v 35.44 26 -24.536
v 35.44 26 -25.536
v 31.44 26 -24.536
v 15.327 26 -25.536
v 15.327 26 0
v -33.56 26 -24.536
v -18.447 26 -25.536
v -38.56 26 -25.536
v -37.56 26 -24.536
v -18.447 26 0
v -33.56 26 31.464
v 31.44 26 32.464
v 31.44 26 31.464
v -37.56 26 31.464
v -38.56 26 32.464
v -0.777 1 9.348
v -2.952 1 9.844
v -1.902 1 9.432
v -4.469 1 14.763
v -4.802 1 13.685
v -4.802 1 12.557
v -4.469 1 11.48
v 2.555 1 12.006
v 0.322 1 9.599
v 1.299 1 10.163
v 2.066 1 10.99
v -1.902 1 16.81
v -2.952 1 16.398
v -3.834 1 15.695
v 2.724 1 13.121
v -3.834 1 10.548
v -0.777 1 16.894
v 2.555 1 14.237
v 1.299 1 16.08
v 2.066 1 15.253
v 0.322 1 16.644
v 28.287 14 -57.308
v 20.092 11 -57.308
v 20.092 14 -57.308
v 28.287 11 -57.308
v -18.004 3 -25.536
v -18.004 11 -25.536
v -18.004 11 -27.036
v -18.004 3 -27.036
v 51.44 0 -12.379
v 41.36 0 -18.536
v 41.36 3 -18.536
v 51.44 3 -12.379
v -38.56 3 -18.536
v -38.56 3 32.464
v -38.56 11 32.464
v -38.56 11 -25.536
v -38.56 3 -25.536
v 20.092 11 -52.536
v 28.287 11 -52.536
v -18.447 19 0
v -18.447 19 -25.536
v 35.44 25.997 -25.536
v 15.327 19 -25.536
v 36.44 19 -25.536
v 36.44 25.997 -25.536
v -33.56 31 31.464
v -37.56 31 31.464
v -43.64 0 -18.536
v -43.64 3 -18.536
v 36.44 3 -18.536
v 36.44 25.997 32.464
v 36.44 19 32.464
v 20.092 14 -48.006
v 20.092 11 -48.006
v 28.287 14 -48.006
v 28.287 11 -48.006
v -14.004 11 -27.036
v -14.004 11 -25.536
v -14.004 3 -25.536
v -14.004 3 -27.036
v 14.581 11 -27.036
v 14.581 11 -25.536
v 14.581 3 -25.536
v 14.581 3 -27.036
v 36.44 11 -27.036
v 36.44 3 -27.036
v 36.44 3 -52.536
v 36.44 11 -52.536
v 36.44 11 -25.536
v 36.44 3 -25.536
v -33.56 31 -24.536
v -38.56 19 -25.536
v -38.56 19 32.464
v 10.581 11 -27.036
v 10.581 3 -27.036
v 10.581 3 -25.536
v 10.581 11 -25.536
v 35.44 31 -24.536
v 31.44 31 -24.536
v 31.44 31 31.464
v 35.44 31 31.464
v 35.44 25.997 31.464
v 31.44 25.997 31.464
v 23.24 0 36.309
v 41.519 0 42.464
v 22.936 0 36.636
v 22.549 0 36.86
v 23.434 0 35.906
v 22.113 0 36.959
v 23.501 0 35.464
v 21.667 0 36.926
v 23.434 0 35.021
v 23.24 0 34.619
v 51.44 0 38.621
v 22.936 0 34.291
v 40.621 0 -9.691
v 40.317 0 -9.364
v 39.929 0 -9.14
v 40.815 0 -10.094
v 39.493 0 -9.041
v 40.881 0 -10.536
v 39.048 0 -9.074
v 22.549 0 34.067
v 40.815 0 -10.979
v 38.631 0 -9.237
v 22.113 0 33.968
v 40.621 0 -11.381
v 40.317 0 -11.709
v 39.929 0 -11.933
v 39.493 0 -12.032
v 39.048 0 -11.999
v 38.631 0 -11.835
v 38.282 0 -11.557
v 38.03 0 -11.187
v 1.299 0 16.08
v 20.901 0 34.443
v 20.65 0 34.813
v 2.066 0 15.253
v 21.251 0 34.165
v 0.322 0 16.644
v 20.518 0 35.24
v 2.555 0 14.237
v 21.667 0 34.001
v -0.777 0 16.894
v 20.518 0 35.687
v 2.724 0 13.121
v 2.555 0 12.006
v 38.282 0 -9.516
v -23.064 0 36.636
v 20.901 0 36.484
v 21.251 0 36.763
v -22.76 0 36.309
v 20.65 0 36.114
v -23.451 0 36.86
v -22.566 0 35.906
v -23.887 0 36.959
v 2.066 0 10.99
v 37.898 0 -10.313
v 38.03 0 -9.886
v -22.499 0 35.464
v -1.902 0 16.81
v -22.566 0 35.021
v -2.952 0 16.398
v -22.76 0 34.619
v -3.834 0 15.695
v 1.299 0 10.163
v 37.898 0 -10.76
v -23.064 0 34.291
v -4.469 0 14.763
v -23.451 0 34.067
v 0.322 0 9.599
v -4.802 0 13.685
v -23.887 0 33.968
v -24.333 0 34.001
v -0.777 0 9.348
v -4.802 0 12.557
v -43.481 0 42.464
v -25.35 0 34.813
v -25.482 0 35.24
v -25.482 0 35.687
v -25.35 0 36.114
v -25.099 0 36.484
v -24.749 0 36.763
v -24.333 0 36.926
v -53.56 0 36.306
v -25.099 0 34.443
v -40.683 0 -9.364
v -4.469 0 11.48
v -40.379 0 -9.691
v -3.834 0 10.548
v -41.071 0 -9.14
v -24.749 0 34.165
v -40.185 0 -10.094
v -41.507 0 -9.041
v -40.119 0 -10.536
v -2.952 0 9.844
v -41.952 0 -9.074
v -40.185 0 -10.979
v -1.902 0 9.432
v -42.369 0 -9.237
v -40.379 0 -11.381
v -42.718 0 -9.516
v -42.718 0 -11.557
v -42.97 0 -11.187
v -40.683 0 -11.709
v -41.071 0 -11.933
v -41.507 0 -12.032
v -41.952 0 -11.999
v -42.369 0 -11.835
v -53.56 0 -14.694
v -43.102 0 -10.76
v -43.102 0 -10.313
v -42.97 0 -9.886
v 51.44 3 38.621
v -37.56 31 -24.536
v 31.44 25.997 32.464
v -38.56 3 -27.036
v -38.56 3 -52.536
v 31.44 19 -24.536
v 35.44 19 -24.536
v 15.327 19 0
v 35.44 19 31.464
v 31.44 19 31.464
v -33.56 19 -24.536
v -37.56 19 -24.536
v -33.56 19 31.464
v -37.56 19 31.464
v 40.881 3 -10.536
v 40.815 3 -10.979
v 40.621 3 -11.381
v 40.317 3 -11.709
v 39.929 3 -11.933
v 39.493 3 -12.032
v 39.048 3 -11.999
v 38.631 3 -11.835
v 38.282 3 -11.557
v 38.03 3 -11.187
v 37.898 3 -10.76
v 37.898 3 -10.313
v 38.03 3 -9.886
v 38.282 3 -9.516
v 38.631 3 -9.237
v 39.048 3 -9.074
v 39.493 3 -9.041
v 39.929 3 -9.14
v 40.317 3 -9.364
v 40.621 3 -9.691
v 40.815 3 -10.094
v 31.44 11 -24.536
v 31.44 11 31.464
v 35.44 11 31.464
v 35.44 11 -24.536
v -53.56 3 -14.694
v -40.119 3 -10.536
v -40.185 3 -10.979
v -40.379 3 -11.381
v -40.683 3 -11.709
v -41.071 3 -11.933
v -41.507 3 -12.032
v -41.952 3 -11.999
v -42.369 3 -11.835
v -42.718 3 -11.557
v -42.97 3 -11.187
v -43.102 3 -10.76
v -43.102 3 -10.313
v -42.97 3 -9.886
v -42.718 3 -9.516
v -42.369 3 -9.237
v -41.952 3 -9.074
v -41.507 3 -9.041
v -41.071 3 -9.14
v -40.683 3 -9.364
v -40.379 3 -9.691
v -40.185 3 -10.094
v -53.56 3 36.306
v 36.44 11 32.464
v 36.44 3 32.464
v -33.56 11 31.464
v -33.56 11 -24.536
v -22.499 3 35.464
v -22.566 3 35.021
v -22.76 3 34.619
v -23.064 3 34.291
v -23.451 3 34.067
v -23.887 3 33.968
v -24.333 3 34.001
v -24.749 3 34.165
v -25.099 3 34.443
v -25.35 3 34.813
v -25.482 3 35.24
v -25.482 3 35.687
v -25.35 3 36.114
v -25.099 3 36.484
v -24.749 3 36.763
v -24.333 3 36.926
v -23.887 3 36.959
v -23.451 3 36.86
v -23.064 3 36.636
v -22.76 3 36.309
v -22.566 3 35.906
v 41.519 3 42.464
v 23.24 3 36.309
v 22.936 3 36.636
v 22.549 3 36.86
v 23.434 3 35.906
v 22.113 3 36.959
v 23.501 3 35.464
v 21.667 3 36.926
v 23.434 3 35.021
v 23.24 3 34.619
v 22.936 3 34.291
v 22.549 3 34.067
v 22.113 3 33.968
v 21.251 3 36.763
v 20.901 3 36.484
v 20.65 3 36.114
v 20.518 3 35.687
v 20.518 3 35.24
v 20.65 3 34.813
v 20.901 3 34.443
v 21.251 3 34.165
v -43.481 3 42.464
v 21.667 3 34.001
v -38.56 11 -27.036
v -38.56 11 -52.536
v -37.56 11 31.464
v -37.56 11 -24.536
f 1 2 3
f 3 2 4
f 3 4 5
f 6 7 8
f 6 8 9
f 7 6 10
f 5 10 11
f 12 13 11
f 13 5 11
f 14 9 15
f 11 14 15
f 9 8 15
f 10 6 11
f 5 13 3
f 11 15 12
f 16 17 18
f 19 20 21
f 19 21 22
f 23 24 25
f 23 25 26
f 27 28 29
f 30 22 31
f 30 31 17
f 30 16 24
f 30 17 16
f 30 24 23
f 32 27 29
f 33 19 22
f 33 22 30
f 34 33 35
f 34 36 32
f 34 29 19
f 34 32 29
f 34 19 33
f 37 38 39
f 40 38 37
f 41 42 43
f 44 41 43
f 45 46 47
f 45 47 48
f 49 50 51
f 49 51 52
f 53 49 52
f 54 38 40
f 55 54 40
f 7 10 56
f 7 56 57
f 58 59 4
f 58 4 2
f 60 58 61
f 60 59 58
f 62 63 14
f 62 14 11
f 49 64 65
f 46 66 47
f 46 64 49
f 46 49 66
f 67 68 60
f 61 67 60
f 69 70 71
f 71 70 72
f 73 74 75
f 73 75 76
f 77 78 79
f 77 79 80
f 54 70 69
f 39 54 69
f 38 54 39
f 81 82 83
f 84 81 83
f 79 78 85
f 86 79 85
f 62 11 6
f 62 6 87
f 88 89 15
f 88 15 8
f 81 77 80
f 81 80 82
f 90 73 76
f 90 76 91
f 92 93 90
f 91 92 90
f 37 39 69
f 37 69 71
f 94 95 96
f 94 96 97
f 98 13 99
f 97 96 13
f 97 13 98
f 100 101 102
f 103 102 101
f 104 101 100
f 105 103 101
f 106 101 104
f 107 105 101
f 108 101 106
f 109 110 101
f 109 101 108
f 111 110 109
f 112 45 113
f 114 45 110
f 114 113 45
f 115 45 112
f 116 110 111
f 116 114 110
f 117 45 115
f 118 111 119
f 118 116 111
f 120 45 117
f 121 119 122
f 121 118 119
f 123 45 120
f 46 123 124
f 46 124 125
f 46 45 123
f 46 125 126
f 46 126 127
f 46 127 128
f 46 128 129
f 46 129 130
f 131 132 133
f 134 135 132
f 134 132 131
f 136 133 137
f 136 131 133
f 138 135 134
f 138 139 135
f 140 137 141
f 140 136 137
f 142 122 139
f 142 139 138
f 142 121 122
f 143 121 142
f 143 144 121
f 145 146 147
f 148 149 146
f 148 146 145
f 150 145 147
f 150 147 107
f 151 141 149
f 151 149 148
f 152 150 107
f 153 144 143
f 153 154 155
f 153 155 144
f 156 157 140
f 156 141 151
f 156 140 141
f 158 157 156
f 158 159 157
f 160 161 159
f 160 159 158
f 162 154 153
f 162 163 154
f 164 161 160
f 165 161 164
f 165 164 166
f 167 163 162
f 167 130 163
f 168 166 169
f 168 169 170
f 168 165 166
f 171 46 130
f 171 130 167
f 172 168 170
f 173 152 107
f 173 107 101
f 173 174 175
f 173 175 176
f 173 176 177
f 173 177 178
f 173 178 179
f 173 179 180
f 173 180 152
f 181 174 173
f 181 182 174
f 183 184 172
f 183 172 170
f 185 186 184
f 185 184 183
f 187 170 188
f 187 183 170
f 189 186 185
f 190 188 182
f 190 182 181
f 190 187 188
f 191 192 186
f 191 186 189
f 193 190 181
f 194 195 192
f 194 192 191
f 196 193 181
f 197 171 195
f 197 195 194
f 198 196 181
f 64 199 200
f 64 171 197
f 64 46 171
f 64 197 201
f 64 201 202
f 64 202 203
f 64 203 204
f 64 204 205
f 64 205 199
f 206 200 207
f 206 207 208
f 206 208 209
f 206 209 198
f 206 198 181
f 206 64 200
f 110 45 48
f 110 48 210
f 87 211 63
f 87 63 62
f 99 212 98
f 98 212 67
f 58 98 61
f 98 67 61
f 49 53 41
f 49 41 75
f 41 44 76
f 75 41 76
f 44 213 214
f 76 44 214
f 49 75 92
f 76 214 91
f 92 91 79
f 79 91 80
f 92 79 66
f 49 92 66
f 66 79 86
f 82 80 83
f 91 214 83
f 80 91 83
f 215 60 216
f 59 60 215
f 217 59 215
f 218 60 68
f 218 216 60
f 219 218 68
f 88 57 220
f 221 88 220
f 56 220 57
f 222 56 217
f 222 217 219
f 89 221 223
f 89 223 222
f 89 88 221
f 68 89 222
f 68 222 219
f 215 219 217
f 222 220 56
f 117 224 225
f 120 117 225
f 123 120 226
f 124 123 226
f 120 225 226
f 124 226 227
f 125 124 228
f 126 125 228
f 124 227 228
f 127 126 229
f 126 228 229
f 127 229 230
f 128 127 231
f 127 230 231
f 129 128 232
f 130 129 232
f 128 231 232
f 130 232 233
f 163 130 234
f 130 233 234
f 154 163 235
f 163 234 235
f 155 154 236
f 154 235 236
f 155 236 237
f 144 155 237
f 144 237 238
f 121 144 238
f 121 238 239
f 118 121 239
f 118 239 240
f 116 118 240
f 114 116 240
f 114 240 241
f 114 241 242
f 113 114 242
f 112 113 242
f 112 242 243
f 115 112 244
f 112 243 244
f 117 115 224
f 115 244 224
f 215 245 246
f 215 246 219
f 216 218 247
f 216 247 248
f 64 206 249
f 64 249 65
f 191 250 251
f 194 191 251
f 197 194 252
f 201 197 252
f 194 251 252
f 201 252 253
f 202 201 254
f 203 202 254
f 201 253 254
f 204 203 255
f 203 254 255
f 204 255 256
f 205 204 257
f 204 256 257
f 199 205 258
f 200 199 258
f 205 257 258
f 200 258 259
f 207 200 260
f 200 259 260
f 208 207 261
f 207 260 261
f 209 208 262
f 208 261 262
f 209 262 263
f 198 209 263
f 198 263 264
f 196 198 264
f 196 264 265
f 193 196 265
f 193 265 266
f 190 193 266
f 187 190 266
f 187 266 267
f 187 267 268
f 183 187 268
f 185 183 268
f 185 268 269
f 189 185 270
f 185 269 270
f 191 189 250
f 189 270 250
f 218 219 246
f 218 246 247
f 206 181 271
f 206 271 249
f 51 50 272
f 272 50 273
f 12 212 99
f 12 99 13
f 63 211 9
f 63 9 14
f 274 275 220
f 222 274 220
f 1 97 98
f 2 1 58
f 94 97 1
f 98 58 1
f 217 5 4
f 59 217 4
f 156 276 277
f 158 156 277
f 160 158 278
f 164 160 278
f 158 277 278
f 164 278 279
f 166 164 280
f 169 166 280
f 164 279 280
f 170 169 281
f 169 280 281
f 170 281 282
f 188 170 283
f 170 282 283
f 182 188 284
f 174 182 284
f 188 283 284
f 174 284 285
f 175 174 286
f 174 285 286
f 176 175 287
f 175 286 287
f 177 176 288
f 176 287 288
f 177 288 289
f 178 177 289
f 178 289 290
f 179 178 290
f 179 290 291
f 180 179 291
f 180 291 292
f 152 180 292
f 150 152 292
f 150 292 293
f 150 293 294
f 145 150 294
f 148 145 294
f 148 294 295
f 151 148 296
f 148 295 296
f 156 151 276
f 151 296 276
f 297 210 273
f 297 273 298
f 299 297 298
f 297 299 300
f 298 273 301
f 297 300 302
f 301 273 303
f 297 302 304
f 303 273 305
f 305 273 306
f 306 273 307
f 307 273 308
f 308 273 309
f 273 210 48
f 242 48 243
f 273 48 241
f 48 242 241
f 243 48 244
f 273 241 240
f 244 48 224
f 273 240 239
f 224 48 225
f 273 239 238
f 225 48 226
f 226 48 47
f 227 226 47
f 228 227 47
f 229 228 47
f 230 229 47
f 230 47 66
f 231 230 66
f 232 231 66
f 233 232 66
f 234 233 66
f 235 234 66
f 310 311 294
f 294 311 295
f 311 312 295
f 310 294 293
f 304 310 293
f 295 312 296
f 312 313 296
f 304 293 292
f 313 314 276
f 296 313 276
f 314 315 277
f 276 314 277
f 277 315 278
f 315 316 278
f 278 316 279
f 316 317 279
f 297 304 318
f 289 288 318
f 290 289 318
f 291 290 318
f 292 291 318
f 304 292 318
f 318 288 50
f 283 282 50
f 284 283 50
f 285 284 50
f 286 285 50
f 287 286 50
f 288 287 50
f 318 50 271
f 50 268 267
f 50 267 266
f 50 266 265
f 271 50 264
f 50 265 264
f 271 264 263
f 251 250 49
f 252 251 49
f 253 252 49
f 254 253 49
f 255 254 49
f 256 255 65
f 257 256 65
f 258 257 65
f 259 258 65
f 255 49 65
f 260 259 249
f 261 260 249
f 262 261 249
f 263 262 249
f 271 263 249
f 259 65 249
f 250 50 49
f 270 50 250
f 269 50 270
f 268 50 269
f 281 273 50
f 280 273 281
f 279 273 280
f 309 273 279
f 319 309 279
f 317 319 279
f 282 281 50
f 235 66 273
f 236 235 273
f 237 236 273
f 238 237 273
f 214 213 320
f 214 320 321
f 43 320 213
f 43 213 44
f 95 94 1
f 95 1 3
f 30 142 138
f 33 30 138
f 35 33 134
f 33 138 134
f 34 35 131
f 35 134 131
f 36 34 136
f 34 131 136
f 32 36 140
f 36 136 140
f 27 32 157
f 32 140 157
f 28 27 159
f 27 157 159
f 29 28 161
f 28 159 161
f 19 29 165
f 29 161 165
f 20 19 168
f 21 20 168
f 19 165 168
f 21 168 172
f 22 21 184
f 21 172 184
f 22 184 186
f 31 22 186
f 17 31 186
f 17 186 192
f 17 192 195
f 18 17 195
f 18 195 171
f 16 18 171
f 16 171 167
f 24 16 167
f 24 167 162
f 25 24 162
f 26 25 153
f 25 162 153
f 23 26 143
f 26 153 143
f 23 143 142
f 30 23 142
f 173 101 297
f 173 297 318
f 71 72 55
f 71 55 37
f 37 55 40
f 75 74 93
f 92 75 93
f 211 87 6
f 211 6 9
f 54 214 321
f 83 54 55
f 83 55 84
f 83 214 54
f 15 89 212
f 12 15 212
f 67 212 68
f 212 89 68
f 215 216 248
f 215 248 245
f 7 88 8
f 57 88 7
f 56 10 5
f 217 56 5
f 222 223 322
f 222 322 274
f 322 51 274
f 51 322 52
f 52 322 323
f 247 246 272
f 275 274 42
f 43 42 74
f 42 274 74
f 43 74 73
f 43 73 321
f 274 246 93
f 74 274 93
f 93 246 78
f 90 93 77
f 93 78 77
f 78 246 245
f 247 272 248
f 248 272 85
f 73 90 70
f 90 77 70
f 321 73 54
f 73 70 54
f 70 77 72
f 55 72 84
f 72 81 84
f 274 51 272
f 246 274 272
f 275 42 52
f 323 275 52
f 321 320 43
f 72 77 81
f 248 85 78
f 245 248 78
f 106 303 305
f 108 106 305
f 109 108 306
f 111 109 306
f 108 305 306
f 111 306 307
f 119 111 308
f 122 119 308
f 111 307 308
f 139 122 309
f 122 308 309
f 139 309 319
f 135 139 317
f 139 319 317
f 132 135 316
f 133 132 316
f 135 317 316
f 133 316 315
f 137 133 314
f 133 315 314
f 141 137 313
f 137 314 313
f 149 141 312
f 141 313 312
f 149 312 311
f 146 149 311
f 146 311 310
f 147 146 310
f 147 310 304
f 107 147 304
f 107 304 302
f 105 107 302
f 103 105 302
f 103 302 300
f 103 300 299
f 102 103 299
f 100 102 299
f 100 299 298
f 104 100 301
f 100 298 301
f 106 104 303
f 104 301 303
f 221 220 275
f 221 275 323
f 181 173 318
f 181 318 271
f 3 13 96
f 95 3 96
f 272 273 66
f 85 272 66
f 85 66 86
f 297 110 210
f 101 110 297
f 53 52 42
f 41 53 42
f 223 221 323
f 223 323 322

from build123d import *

# Parameters (mm, degrees)
BOSS_EXTRU_1_DEPTH      = 3
ESQUISSE2_R             = 1.5
ENL_V_MAT_EXTRU_1_DEPTH = 3
ESQUISSE3_W             = 75
ESQUISSE3_H             = 85
BOSS_EXTRU_2_DEPTH      = 8
ESQUISSE5_W             = 75
ESQUISSE5_H             = 58
BOSS_EXTRU_4_DEPTH      = 20
ESQUISSE6_R             = 3.783823372
ENL_V_MAT_EXTRU_2_DEPTH = 1
ESQUISSE8_W             = 65
ESQUISSE8_H             = 8
ESQUISSE8_H_2           = 5
ENL_V_MAT_EXTRU_3_DEPTH = 86
ESQUISSE9_W             = 58
ESQUISSE9_H             = 8
ESQUISSE9_H_2           = 5
ENL_V_MAT_EXTRU_4_DEPTH = 1
ESQUISSE10_W            = 58
ESQUISSE10_H            = 5.00265017
ESQUISSE10_H_2          = 8
ENL_V_MAT_EXTRU_5_DEPTH = 1
ESQUISSE11_W            = 4
ESQUISSE11_H            = 5
ESQUISSE11_H_2          = 8
ENL_V_MAT_EXTRU_6_DEPTH = 1
ESQUISSE12_W            = 4
ESQUISSE12_H            = 5
ESQUISSE12_H_2          = 8
ESQUISSE12_H_3          = 5.00265017
ENL_V_MAT_EXTRU_7_DEPTH = 1
ESQUISSE13_W            = 33.774018013
ESQUISSE13_H            = 51.072823149
ENL_V_MAT_EXTRU_8_DEPTH = 8
ESQUISSE14_W            = 20.555972115
ESQUISSE14_H            = 1.5
ESQUISSE14_W_2          = 21.85857566
ESQUISSE14_W_3          = 24.585452225
ENL_V_MAT_EXTRU_9_DEPTH = 8
ESQUISSE15_W            = 8.195150742
ESQUISSE15_H            = 9.302603545
BOSS_EXTRU_5_DEPTH      = 3


with BuildPart() as part:
    # Esquisse1 → Boss.-Extru.1 (new body)
    with BuildSketch(Plane(origin=(0, 0, 0), x_dir=(1, 0, 0), z_dir=(0, 1, 0))):
        Polygon((-53.560263118, 14.694067924), (-43.639645315, 18.536411574), (41.360354685, 18.536411574), (51.439736882, 12.378755225), (51.439736882, -38.621244775), (41.519119079, -42.463588426), (-43.480880921, -42.463588426), (-53.560263118, -36.305932076), align=None)
    extrude(amount=BOSS_EXTRU_1_DEPTH)

    # Esquisse2 → Enlèv. mat.-Extru.1 (cut)
    with BuildSketch(Plane(origin=(0, 3, 0), x_dir=(1, 0, 0), z_dir=(0, 1, 0))):
        with Locations((39.381313418, 10.536411574)):
            Circle(ESQUISSE2_R)
        with Locations((-41.618686582, 10.536411574)):
            Circle(ESQUISSE2_R)
        with Locations((-23.999021885, -35.463588426)):
            Circle(ESQUISSE2_R)
        with Locations((22.000978115, -35.463588426)):
            Circle(ESQUISSE2_R)
    extrude(amount=-ENL_V_MAT_EXTRU_1_DEPTH, mode=Mode.SUBTRACT)

    # Esquisse3 → Boss.-Extru.2 (add)
    with BuildSketch(Plane(origin=(0, 3, 0), x_dir=(1, 0, 0), z_dir=(0, 1, 0))):
        with Locations((-1.060263118, 10.036411574)):
            Rectangle(ESQUISSE3_W, ESQUISSE3_H)
    extrude(amount=BOSS_EXTRU_2_DEPTH)

    # Esquisse5 → Boss.-Extru.4 (add)
    with BuildSketch(Plane(origin=(0, 11, 0), x_dir=(1, 0, 0), z_dir=(0, 1, 0))):
        with Locations((-1.060263118, -3.463588426)):
            Rectangle(ESQUISSE5_W, ESQUISSE5_H)
    extrude(amount=BOSS_EXTRU_4_DEPTH)

    # Esquisse6 → Enlèv. mat.-Extru.2 (cut)
    with BuildSketch(Plane.XZ):
        with Locations((-1.060263118, 13.121244775)):
            Circle(ESQUISSE6_R)
    extrude(amount=-ENL_V_MAT_EXTRU_2_DEPTH, mode=Mode.SUBTRACT)

    # Esquisse8 → Enlèv. mat.-Extru.3 (cut)
    with BuildSketch(Plane(origin=(0, 0, -25.536411574), x_dir=(-1, 0, 0), z_dir=(0, 0, -1))):
        with Locations((1.060263118, 15)):
            Rectangle(ESQUISSE8_W, ESQUISSE8_H)
        with Locations((1.060263118, 28.5)):
            Rectangle(ESQUISSE8_W, ESQUISSE8_H_2)
    extrude(amount=-ENL_V_MAT_EXTRU_3_DEPTH, mode=Mode.SUBTRACT)

    # Esquisse9 → Enlèv. mat.-Extru.4 (cut)
    with BuildSketch(Plane.ZY.offset(38.560263118)):
        with Locations((3.463588426, 15)):
            Rectangle(ESQUISSE9_W, ESQUISSE9_H)
        with Locations((3.463588426, 28.5)):
            Rectangle(ESQUISSE9_W, ESQUISSE9_H_2)
    extrude(amount=-ENL_V_MAT_EXTRU_4_DEPTH, mode=Mode.SUBTRACT)

    # Esquisse10 → Enlèv. mat.-Extru.5 (cut)
    with BuildSketch(Plane(origin=(36.439736882, 0, 0), x_dir=(0, 0, -1), z_dir=(1, 0, 0))):
        with Locations((-3.463588426, 28.498674915)):
            Rectangle(ESQUISSE10_W, ESQUISSE10_H)
        with Locations((-3.463588426, 15)):
            Rectangle(ESQUISSE10_W, ESQUISSE10_H_2)
    extrude(amount=-ENL_V_MAT_EXTRU_5_DEPTH, mode=Mode.SUBTRACT)

    # Esquisse11 → Enlèv. mat.-Extru.6 (cut)
    with BuildSketch(Plane(origin=(0, 0, -25.536411574), x_dir=(-1, 0, 0), z_dir=(0, 0, -1))):
        with Locations((-33.439736882, 28.5)):
            Rectangle(ESQUISSE11_W, ESQUISSE11_H)
        with Locations((-33.439736882, 15)):
            Rectangle(ESQUISSE11_W, ESQUISSE11_H_2)
        with Locations((35.560263118, 15)):
            Rectangle(ESQUISSE11_W, ESQUISSE11_H_2)
        with Locations((35.560263118, 28.5)):
            Rectangle(ESQUISSE11_W, ESQUISSE11_H)
    extrude(amount=-ENL_V_MAT_EXTRU_6_DEPTH, mode=Mode.SUBTRACT)

    # Esquisse12 → Enlèv. mat.-Extru.7 (cut)
    with BuildSketch(Plane.XY.offset(32.463588426)):
        with Locations((-35.560263118, 28.5)):
            Rectangle(ESQUISSE12_W, ESQUISSE12_H)
        with Locations((-35.560263118, 15)):
            Rectangle(ESQUISSE12_W, ESQUISSE12_H_2)
        with Locations((33.439736882, 28.498674915)):
            Rectangle(ESQUISSE12_W, ESQUISSE12_H_3)
        with Locations((33.439736882, 15)):
            Rectangle(ESQUISSE12_W, ESQUISSE12_H_2)
    extrude(amount=-ENL_V_MAT_EXTRU_7_DEPTH, mode=Mode.SUBTRACT)

    # Esquisse13 → Enlèv. mat.-Extru.8 (cut)
    with BuildSketch(Plane(origin=(0, 26, 0), x_dir=(1, 0, 0), z_dir=(0, 1, 0))):
        with Locations((-1.560263118, 25.536411575)):
            Rectangle(ESQUISSE13_W, ESQUISSE13_H)
    extrude(amount=-ENL_V_MAT_EXTRU_8_DEPTH, mode=Mode.SUBTRACT)

    # Esquisse14 → Enlèv. mat.-Extru.9 (cut)
    with BuildSketch(Plane(origin=(0, 11, 0), x_dir=(1, 0, 0), z_dir=(0, 1, 0))):
        with Locations((-28.282277061, 26.286411574)):
            Rectangle(ESQUISSE14_W, ESQUISSE14_H)
        with Locations((25.510449052, 26.286411574)):
            Rectangle(ESQUISSE14_W_2, ESQUISSE14_H)
        with Locations((-1.711564891, 26.286411574)):
            Rectangle(ESQUISSE14_W_3, ESQUISSE14_H)
    extrude(amount=-ENL_V_MAT_EXTRU_9_DEPTH, mode=Mode.SUBTRACT)

    # Esquisse15 → Boss.-Extru.5 (add)
    with BuildSketch(Plane(origin=(0, 11, 0), x_dir=(1, 0, 0), z_dir=(0, 1, 0))):
        with Locations((24.189660789, 52.656882102)):
            Rectangle(ESQUISSE15_W, ESQUISSE15_H)
    extrude(amount=BOSS_EXTRU_5_DEPTH)


solid = part.part
